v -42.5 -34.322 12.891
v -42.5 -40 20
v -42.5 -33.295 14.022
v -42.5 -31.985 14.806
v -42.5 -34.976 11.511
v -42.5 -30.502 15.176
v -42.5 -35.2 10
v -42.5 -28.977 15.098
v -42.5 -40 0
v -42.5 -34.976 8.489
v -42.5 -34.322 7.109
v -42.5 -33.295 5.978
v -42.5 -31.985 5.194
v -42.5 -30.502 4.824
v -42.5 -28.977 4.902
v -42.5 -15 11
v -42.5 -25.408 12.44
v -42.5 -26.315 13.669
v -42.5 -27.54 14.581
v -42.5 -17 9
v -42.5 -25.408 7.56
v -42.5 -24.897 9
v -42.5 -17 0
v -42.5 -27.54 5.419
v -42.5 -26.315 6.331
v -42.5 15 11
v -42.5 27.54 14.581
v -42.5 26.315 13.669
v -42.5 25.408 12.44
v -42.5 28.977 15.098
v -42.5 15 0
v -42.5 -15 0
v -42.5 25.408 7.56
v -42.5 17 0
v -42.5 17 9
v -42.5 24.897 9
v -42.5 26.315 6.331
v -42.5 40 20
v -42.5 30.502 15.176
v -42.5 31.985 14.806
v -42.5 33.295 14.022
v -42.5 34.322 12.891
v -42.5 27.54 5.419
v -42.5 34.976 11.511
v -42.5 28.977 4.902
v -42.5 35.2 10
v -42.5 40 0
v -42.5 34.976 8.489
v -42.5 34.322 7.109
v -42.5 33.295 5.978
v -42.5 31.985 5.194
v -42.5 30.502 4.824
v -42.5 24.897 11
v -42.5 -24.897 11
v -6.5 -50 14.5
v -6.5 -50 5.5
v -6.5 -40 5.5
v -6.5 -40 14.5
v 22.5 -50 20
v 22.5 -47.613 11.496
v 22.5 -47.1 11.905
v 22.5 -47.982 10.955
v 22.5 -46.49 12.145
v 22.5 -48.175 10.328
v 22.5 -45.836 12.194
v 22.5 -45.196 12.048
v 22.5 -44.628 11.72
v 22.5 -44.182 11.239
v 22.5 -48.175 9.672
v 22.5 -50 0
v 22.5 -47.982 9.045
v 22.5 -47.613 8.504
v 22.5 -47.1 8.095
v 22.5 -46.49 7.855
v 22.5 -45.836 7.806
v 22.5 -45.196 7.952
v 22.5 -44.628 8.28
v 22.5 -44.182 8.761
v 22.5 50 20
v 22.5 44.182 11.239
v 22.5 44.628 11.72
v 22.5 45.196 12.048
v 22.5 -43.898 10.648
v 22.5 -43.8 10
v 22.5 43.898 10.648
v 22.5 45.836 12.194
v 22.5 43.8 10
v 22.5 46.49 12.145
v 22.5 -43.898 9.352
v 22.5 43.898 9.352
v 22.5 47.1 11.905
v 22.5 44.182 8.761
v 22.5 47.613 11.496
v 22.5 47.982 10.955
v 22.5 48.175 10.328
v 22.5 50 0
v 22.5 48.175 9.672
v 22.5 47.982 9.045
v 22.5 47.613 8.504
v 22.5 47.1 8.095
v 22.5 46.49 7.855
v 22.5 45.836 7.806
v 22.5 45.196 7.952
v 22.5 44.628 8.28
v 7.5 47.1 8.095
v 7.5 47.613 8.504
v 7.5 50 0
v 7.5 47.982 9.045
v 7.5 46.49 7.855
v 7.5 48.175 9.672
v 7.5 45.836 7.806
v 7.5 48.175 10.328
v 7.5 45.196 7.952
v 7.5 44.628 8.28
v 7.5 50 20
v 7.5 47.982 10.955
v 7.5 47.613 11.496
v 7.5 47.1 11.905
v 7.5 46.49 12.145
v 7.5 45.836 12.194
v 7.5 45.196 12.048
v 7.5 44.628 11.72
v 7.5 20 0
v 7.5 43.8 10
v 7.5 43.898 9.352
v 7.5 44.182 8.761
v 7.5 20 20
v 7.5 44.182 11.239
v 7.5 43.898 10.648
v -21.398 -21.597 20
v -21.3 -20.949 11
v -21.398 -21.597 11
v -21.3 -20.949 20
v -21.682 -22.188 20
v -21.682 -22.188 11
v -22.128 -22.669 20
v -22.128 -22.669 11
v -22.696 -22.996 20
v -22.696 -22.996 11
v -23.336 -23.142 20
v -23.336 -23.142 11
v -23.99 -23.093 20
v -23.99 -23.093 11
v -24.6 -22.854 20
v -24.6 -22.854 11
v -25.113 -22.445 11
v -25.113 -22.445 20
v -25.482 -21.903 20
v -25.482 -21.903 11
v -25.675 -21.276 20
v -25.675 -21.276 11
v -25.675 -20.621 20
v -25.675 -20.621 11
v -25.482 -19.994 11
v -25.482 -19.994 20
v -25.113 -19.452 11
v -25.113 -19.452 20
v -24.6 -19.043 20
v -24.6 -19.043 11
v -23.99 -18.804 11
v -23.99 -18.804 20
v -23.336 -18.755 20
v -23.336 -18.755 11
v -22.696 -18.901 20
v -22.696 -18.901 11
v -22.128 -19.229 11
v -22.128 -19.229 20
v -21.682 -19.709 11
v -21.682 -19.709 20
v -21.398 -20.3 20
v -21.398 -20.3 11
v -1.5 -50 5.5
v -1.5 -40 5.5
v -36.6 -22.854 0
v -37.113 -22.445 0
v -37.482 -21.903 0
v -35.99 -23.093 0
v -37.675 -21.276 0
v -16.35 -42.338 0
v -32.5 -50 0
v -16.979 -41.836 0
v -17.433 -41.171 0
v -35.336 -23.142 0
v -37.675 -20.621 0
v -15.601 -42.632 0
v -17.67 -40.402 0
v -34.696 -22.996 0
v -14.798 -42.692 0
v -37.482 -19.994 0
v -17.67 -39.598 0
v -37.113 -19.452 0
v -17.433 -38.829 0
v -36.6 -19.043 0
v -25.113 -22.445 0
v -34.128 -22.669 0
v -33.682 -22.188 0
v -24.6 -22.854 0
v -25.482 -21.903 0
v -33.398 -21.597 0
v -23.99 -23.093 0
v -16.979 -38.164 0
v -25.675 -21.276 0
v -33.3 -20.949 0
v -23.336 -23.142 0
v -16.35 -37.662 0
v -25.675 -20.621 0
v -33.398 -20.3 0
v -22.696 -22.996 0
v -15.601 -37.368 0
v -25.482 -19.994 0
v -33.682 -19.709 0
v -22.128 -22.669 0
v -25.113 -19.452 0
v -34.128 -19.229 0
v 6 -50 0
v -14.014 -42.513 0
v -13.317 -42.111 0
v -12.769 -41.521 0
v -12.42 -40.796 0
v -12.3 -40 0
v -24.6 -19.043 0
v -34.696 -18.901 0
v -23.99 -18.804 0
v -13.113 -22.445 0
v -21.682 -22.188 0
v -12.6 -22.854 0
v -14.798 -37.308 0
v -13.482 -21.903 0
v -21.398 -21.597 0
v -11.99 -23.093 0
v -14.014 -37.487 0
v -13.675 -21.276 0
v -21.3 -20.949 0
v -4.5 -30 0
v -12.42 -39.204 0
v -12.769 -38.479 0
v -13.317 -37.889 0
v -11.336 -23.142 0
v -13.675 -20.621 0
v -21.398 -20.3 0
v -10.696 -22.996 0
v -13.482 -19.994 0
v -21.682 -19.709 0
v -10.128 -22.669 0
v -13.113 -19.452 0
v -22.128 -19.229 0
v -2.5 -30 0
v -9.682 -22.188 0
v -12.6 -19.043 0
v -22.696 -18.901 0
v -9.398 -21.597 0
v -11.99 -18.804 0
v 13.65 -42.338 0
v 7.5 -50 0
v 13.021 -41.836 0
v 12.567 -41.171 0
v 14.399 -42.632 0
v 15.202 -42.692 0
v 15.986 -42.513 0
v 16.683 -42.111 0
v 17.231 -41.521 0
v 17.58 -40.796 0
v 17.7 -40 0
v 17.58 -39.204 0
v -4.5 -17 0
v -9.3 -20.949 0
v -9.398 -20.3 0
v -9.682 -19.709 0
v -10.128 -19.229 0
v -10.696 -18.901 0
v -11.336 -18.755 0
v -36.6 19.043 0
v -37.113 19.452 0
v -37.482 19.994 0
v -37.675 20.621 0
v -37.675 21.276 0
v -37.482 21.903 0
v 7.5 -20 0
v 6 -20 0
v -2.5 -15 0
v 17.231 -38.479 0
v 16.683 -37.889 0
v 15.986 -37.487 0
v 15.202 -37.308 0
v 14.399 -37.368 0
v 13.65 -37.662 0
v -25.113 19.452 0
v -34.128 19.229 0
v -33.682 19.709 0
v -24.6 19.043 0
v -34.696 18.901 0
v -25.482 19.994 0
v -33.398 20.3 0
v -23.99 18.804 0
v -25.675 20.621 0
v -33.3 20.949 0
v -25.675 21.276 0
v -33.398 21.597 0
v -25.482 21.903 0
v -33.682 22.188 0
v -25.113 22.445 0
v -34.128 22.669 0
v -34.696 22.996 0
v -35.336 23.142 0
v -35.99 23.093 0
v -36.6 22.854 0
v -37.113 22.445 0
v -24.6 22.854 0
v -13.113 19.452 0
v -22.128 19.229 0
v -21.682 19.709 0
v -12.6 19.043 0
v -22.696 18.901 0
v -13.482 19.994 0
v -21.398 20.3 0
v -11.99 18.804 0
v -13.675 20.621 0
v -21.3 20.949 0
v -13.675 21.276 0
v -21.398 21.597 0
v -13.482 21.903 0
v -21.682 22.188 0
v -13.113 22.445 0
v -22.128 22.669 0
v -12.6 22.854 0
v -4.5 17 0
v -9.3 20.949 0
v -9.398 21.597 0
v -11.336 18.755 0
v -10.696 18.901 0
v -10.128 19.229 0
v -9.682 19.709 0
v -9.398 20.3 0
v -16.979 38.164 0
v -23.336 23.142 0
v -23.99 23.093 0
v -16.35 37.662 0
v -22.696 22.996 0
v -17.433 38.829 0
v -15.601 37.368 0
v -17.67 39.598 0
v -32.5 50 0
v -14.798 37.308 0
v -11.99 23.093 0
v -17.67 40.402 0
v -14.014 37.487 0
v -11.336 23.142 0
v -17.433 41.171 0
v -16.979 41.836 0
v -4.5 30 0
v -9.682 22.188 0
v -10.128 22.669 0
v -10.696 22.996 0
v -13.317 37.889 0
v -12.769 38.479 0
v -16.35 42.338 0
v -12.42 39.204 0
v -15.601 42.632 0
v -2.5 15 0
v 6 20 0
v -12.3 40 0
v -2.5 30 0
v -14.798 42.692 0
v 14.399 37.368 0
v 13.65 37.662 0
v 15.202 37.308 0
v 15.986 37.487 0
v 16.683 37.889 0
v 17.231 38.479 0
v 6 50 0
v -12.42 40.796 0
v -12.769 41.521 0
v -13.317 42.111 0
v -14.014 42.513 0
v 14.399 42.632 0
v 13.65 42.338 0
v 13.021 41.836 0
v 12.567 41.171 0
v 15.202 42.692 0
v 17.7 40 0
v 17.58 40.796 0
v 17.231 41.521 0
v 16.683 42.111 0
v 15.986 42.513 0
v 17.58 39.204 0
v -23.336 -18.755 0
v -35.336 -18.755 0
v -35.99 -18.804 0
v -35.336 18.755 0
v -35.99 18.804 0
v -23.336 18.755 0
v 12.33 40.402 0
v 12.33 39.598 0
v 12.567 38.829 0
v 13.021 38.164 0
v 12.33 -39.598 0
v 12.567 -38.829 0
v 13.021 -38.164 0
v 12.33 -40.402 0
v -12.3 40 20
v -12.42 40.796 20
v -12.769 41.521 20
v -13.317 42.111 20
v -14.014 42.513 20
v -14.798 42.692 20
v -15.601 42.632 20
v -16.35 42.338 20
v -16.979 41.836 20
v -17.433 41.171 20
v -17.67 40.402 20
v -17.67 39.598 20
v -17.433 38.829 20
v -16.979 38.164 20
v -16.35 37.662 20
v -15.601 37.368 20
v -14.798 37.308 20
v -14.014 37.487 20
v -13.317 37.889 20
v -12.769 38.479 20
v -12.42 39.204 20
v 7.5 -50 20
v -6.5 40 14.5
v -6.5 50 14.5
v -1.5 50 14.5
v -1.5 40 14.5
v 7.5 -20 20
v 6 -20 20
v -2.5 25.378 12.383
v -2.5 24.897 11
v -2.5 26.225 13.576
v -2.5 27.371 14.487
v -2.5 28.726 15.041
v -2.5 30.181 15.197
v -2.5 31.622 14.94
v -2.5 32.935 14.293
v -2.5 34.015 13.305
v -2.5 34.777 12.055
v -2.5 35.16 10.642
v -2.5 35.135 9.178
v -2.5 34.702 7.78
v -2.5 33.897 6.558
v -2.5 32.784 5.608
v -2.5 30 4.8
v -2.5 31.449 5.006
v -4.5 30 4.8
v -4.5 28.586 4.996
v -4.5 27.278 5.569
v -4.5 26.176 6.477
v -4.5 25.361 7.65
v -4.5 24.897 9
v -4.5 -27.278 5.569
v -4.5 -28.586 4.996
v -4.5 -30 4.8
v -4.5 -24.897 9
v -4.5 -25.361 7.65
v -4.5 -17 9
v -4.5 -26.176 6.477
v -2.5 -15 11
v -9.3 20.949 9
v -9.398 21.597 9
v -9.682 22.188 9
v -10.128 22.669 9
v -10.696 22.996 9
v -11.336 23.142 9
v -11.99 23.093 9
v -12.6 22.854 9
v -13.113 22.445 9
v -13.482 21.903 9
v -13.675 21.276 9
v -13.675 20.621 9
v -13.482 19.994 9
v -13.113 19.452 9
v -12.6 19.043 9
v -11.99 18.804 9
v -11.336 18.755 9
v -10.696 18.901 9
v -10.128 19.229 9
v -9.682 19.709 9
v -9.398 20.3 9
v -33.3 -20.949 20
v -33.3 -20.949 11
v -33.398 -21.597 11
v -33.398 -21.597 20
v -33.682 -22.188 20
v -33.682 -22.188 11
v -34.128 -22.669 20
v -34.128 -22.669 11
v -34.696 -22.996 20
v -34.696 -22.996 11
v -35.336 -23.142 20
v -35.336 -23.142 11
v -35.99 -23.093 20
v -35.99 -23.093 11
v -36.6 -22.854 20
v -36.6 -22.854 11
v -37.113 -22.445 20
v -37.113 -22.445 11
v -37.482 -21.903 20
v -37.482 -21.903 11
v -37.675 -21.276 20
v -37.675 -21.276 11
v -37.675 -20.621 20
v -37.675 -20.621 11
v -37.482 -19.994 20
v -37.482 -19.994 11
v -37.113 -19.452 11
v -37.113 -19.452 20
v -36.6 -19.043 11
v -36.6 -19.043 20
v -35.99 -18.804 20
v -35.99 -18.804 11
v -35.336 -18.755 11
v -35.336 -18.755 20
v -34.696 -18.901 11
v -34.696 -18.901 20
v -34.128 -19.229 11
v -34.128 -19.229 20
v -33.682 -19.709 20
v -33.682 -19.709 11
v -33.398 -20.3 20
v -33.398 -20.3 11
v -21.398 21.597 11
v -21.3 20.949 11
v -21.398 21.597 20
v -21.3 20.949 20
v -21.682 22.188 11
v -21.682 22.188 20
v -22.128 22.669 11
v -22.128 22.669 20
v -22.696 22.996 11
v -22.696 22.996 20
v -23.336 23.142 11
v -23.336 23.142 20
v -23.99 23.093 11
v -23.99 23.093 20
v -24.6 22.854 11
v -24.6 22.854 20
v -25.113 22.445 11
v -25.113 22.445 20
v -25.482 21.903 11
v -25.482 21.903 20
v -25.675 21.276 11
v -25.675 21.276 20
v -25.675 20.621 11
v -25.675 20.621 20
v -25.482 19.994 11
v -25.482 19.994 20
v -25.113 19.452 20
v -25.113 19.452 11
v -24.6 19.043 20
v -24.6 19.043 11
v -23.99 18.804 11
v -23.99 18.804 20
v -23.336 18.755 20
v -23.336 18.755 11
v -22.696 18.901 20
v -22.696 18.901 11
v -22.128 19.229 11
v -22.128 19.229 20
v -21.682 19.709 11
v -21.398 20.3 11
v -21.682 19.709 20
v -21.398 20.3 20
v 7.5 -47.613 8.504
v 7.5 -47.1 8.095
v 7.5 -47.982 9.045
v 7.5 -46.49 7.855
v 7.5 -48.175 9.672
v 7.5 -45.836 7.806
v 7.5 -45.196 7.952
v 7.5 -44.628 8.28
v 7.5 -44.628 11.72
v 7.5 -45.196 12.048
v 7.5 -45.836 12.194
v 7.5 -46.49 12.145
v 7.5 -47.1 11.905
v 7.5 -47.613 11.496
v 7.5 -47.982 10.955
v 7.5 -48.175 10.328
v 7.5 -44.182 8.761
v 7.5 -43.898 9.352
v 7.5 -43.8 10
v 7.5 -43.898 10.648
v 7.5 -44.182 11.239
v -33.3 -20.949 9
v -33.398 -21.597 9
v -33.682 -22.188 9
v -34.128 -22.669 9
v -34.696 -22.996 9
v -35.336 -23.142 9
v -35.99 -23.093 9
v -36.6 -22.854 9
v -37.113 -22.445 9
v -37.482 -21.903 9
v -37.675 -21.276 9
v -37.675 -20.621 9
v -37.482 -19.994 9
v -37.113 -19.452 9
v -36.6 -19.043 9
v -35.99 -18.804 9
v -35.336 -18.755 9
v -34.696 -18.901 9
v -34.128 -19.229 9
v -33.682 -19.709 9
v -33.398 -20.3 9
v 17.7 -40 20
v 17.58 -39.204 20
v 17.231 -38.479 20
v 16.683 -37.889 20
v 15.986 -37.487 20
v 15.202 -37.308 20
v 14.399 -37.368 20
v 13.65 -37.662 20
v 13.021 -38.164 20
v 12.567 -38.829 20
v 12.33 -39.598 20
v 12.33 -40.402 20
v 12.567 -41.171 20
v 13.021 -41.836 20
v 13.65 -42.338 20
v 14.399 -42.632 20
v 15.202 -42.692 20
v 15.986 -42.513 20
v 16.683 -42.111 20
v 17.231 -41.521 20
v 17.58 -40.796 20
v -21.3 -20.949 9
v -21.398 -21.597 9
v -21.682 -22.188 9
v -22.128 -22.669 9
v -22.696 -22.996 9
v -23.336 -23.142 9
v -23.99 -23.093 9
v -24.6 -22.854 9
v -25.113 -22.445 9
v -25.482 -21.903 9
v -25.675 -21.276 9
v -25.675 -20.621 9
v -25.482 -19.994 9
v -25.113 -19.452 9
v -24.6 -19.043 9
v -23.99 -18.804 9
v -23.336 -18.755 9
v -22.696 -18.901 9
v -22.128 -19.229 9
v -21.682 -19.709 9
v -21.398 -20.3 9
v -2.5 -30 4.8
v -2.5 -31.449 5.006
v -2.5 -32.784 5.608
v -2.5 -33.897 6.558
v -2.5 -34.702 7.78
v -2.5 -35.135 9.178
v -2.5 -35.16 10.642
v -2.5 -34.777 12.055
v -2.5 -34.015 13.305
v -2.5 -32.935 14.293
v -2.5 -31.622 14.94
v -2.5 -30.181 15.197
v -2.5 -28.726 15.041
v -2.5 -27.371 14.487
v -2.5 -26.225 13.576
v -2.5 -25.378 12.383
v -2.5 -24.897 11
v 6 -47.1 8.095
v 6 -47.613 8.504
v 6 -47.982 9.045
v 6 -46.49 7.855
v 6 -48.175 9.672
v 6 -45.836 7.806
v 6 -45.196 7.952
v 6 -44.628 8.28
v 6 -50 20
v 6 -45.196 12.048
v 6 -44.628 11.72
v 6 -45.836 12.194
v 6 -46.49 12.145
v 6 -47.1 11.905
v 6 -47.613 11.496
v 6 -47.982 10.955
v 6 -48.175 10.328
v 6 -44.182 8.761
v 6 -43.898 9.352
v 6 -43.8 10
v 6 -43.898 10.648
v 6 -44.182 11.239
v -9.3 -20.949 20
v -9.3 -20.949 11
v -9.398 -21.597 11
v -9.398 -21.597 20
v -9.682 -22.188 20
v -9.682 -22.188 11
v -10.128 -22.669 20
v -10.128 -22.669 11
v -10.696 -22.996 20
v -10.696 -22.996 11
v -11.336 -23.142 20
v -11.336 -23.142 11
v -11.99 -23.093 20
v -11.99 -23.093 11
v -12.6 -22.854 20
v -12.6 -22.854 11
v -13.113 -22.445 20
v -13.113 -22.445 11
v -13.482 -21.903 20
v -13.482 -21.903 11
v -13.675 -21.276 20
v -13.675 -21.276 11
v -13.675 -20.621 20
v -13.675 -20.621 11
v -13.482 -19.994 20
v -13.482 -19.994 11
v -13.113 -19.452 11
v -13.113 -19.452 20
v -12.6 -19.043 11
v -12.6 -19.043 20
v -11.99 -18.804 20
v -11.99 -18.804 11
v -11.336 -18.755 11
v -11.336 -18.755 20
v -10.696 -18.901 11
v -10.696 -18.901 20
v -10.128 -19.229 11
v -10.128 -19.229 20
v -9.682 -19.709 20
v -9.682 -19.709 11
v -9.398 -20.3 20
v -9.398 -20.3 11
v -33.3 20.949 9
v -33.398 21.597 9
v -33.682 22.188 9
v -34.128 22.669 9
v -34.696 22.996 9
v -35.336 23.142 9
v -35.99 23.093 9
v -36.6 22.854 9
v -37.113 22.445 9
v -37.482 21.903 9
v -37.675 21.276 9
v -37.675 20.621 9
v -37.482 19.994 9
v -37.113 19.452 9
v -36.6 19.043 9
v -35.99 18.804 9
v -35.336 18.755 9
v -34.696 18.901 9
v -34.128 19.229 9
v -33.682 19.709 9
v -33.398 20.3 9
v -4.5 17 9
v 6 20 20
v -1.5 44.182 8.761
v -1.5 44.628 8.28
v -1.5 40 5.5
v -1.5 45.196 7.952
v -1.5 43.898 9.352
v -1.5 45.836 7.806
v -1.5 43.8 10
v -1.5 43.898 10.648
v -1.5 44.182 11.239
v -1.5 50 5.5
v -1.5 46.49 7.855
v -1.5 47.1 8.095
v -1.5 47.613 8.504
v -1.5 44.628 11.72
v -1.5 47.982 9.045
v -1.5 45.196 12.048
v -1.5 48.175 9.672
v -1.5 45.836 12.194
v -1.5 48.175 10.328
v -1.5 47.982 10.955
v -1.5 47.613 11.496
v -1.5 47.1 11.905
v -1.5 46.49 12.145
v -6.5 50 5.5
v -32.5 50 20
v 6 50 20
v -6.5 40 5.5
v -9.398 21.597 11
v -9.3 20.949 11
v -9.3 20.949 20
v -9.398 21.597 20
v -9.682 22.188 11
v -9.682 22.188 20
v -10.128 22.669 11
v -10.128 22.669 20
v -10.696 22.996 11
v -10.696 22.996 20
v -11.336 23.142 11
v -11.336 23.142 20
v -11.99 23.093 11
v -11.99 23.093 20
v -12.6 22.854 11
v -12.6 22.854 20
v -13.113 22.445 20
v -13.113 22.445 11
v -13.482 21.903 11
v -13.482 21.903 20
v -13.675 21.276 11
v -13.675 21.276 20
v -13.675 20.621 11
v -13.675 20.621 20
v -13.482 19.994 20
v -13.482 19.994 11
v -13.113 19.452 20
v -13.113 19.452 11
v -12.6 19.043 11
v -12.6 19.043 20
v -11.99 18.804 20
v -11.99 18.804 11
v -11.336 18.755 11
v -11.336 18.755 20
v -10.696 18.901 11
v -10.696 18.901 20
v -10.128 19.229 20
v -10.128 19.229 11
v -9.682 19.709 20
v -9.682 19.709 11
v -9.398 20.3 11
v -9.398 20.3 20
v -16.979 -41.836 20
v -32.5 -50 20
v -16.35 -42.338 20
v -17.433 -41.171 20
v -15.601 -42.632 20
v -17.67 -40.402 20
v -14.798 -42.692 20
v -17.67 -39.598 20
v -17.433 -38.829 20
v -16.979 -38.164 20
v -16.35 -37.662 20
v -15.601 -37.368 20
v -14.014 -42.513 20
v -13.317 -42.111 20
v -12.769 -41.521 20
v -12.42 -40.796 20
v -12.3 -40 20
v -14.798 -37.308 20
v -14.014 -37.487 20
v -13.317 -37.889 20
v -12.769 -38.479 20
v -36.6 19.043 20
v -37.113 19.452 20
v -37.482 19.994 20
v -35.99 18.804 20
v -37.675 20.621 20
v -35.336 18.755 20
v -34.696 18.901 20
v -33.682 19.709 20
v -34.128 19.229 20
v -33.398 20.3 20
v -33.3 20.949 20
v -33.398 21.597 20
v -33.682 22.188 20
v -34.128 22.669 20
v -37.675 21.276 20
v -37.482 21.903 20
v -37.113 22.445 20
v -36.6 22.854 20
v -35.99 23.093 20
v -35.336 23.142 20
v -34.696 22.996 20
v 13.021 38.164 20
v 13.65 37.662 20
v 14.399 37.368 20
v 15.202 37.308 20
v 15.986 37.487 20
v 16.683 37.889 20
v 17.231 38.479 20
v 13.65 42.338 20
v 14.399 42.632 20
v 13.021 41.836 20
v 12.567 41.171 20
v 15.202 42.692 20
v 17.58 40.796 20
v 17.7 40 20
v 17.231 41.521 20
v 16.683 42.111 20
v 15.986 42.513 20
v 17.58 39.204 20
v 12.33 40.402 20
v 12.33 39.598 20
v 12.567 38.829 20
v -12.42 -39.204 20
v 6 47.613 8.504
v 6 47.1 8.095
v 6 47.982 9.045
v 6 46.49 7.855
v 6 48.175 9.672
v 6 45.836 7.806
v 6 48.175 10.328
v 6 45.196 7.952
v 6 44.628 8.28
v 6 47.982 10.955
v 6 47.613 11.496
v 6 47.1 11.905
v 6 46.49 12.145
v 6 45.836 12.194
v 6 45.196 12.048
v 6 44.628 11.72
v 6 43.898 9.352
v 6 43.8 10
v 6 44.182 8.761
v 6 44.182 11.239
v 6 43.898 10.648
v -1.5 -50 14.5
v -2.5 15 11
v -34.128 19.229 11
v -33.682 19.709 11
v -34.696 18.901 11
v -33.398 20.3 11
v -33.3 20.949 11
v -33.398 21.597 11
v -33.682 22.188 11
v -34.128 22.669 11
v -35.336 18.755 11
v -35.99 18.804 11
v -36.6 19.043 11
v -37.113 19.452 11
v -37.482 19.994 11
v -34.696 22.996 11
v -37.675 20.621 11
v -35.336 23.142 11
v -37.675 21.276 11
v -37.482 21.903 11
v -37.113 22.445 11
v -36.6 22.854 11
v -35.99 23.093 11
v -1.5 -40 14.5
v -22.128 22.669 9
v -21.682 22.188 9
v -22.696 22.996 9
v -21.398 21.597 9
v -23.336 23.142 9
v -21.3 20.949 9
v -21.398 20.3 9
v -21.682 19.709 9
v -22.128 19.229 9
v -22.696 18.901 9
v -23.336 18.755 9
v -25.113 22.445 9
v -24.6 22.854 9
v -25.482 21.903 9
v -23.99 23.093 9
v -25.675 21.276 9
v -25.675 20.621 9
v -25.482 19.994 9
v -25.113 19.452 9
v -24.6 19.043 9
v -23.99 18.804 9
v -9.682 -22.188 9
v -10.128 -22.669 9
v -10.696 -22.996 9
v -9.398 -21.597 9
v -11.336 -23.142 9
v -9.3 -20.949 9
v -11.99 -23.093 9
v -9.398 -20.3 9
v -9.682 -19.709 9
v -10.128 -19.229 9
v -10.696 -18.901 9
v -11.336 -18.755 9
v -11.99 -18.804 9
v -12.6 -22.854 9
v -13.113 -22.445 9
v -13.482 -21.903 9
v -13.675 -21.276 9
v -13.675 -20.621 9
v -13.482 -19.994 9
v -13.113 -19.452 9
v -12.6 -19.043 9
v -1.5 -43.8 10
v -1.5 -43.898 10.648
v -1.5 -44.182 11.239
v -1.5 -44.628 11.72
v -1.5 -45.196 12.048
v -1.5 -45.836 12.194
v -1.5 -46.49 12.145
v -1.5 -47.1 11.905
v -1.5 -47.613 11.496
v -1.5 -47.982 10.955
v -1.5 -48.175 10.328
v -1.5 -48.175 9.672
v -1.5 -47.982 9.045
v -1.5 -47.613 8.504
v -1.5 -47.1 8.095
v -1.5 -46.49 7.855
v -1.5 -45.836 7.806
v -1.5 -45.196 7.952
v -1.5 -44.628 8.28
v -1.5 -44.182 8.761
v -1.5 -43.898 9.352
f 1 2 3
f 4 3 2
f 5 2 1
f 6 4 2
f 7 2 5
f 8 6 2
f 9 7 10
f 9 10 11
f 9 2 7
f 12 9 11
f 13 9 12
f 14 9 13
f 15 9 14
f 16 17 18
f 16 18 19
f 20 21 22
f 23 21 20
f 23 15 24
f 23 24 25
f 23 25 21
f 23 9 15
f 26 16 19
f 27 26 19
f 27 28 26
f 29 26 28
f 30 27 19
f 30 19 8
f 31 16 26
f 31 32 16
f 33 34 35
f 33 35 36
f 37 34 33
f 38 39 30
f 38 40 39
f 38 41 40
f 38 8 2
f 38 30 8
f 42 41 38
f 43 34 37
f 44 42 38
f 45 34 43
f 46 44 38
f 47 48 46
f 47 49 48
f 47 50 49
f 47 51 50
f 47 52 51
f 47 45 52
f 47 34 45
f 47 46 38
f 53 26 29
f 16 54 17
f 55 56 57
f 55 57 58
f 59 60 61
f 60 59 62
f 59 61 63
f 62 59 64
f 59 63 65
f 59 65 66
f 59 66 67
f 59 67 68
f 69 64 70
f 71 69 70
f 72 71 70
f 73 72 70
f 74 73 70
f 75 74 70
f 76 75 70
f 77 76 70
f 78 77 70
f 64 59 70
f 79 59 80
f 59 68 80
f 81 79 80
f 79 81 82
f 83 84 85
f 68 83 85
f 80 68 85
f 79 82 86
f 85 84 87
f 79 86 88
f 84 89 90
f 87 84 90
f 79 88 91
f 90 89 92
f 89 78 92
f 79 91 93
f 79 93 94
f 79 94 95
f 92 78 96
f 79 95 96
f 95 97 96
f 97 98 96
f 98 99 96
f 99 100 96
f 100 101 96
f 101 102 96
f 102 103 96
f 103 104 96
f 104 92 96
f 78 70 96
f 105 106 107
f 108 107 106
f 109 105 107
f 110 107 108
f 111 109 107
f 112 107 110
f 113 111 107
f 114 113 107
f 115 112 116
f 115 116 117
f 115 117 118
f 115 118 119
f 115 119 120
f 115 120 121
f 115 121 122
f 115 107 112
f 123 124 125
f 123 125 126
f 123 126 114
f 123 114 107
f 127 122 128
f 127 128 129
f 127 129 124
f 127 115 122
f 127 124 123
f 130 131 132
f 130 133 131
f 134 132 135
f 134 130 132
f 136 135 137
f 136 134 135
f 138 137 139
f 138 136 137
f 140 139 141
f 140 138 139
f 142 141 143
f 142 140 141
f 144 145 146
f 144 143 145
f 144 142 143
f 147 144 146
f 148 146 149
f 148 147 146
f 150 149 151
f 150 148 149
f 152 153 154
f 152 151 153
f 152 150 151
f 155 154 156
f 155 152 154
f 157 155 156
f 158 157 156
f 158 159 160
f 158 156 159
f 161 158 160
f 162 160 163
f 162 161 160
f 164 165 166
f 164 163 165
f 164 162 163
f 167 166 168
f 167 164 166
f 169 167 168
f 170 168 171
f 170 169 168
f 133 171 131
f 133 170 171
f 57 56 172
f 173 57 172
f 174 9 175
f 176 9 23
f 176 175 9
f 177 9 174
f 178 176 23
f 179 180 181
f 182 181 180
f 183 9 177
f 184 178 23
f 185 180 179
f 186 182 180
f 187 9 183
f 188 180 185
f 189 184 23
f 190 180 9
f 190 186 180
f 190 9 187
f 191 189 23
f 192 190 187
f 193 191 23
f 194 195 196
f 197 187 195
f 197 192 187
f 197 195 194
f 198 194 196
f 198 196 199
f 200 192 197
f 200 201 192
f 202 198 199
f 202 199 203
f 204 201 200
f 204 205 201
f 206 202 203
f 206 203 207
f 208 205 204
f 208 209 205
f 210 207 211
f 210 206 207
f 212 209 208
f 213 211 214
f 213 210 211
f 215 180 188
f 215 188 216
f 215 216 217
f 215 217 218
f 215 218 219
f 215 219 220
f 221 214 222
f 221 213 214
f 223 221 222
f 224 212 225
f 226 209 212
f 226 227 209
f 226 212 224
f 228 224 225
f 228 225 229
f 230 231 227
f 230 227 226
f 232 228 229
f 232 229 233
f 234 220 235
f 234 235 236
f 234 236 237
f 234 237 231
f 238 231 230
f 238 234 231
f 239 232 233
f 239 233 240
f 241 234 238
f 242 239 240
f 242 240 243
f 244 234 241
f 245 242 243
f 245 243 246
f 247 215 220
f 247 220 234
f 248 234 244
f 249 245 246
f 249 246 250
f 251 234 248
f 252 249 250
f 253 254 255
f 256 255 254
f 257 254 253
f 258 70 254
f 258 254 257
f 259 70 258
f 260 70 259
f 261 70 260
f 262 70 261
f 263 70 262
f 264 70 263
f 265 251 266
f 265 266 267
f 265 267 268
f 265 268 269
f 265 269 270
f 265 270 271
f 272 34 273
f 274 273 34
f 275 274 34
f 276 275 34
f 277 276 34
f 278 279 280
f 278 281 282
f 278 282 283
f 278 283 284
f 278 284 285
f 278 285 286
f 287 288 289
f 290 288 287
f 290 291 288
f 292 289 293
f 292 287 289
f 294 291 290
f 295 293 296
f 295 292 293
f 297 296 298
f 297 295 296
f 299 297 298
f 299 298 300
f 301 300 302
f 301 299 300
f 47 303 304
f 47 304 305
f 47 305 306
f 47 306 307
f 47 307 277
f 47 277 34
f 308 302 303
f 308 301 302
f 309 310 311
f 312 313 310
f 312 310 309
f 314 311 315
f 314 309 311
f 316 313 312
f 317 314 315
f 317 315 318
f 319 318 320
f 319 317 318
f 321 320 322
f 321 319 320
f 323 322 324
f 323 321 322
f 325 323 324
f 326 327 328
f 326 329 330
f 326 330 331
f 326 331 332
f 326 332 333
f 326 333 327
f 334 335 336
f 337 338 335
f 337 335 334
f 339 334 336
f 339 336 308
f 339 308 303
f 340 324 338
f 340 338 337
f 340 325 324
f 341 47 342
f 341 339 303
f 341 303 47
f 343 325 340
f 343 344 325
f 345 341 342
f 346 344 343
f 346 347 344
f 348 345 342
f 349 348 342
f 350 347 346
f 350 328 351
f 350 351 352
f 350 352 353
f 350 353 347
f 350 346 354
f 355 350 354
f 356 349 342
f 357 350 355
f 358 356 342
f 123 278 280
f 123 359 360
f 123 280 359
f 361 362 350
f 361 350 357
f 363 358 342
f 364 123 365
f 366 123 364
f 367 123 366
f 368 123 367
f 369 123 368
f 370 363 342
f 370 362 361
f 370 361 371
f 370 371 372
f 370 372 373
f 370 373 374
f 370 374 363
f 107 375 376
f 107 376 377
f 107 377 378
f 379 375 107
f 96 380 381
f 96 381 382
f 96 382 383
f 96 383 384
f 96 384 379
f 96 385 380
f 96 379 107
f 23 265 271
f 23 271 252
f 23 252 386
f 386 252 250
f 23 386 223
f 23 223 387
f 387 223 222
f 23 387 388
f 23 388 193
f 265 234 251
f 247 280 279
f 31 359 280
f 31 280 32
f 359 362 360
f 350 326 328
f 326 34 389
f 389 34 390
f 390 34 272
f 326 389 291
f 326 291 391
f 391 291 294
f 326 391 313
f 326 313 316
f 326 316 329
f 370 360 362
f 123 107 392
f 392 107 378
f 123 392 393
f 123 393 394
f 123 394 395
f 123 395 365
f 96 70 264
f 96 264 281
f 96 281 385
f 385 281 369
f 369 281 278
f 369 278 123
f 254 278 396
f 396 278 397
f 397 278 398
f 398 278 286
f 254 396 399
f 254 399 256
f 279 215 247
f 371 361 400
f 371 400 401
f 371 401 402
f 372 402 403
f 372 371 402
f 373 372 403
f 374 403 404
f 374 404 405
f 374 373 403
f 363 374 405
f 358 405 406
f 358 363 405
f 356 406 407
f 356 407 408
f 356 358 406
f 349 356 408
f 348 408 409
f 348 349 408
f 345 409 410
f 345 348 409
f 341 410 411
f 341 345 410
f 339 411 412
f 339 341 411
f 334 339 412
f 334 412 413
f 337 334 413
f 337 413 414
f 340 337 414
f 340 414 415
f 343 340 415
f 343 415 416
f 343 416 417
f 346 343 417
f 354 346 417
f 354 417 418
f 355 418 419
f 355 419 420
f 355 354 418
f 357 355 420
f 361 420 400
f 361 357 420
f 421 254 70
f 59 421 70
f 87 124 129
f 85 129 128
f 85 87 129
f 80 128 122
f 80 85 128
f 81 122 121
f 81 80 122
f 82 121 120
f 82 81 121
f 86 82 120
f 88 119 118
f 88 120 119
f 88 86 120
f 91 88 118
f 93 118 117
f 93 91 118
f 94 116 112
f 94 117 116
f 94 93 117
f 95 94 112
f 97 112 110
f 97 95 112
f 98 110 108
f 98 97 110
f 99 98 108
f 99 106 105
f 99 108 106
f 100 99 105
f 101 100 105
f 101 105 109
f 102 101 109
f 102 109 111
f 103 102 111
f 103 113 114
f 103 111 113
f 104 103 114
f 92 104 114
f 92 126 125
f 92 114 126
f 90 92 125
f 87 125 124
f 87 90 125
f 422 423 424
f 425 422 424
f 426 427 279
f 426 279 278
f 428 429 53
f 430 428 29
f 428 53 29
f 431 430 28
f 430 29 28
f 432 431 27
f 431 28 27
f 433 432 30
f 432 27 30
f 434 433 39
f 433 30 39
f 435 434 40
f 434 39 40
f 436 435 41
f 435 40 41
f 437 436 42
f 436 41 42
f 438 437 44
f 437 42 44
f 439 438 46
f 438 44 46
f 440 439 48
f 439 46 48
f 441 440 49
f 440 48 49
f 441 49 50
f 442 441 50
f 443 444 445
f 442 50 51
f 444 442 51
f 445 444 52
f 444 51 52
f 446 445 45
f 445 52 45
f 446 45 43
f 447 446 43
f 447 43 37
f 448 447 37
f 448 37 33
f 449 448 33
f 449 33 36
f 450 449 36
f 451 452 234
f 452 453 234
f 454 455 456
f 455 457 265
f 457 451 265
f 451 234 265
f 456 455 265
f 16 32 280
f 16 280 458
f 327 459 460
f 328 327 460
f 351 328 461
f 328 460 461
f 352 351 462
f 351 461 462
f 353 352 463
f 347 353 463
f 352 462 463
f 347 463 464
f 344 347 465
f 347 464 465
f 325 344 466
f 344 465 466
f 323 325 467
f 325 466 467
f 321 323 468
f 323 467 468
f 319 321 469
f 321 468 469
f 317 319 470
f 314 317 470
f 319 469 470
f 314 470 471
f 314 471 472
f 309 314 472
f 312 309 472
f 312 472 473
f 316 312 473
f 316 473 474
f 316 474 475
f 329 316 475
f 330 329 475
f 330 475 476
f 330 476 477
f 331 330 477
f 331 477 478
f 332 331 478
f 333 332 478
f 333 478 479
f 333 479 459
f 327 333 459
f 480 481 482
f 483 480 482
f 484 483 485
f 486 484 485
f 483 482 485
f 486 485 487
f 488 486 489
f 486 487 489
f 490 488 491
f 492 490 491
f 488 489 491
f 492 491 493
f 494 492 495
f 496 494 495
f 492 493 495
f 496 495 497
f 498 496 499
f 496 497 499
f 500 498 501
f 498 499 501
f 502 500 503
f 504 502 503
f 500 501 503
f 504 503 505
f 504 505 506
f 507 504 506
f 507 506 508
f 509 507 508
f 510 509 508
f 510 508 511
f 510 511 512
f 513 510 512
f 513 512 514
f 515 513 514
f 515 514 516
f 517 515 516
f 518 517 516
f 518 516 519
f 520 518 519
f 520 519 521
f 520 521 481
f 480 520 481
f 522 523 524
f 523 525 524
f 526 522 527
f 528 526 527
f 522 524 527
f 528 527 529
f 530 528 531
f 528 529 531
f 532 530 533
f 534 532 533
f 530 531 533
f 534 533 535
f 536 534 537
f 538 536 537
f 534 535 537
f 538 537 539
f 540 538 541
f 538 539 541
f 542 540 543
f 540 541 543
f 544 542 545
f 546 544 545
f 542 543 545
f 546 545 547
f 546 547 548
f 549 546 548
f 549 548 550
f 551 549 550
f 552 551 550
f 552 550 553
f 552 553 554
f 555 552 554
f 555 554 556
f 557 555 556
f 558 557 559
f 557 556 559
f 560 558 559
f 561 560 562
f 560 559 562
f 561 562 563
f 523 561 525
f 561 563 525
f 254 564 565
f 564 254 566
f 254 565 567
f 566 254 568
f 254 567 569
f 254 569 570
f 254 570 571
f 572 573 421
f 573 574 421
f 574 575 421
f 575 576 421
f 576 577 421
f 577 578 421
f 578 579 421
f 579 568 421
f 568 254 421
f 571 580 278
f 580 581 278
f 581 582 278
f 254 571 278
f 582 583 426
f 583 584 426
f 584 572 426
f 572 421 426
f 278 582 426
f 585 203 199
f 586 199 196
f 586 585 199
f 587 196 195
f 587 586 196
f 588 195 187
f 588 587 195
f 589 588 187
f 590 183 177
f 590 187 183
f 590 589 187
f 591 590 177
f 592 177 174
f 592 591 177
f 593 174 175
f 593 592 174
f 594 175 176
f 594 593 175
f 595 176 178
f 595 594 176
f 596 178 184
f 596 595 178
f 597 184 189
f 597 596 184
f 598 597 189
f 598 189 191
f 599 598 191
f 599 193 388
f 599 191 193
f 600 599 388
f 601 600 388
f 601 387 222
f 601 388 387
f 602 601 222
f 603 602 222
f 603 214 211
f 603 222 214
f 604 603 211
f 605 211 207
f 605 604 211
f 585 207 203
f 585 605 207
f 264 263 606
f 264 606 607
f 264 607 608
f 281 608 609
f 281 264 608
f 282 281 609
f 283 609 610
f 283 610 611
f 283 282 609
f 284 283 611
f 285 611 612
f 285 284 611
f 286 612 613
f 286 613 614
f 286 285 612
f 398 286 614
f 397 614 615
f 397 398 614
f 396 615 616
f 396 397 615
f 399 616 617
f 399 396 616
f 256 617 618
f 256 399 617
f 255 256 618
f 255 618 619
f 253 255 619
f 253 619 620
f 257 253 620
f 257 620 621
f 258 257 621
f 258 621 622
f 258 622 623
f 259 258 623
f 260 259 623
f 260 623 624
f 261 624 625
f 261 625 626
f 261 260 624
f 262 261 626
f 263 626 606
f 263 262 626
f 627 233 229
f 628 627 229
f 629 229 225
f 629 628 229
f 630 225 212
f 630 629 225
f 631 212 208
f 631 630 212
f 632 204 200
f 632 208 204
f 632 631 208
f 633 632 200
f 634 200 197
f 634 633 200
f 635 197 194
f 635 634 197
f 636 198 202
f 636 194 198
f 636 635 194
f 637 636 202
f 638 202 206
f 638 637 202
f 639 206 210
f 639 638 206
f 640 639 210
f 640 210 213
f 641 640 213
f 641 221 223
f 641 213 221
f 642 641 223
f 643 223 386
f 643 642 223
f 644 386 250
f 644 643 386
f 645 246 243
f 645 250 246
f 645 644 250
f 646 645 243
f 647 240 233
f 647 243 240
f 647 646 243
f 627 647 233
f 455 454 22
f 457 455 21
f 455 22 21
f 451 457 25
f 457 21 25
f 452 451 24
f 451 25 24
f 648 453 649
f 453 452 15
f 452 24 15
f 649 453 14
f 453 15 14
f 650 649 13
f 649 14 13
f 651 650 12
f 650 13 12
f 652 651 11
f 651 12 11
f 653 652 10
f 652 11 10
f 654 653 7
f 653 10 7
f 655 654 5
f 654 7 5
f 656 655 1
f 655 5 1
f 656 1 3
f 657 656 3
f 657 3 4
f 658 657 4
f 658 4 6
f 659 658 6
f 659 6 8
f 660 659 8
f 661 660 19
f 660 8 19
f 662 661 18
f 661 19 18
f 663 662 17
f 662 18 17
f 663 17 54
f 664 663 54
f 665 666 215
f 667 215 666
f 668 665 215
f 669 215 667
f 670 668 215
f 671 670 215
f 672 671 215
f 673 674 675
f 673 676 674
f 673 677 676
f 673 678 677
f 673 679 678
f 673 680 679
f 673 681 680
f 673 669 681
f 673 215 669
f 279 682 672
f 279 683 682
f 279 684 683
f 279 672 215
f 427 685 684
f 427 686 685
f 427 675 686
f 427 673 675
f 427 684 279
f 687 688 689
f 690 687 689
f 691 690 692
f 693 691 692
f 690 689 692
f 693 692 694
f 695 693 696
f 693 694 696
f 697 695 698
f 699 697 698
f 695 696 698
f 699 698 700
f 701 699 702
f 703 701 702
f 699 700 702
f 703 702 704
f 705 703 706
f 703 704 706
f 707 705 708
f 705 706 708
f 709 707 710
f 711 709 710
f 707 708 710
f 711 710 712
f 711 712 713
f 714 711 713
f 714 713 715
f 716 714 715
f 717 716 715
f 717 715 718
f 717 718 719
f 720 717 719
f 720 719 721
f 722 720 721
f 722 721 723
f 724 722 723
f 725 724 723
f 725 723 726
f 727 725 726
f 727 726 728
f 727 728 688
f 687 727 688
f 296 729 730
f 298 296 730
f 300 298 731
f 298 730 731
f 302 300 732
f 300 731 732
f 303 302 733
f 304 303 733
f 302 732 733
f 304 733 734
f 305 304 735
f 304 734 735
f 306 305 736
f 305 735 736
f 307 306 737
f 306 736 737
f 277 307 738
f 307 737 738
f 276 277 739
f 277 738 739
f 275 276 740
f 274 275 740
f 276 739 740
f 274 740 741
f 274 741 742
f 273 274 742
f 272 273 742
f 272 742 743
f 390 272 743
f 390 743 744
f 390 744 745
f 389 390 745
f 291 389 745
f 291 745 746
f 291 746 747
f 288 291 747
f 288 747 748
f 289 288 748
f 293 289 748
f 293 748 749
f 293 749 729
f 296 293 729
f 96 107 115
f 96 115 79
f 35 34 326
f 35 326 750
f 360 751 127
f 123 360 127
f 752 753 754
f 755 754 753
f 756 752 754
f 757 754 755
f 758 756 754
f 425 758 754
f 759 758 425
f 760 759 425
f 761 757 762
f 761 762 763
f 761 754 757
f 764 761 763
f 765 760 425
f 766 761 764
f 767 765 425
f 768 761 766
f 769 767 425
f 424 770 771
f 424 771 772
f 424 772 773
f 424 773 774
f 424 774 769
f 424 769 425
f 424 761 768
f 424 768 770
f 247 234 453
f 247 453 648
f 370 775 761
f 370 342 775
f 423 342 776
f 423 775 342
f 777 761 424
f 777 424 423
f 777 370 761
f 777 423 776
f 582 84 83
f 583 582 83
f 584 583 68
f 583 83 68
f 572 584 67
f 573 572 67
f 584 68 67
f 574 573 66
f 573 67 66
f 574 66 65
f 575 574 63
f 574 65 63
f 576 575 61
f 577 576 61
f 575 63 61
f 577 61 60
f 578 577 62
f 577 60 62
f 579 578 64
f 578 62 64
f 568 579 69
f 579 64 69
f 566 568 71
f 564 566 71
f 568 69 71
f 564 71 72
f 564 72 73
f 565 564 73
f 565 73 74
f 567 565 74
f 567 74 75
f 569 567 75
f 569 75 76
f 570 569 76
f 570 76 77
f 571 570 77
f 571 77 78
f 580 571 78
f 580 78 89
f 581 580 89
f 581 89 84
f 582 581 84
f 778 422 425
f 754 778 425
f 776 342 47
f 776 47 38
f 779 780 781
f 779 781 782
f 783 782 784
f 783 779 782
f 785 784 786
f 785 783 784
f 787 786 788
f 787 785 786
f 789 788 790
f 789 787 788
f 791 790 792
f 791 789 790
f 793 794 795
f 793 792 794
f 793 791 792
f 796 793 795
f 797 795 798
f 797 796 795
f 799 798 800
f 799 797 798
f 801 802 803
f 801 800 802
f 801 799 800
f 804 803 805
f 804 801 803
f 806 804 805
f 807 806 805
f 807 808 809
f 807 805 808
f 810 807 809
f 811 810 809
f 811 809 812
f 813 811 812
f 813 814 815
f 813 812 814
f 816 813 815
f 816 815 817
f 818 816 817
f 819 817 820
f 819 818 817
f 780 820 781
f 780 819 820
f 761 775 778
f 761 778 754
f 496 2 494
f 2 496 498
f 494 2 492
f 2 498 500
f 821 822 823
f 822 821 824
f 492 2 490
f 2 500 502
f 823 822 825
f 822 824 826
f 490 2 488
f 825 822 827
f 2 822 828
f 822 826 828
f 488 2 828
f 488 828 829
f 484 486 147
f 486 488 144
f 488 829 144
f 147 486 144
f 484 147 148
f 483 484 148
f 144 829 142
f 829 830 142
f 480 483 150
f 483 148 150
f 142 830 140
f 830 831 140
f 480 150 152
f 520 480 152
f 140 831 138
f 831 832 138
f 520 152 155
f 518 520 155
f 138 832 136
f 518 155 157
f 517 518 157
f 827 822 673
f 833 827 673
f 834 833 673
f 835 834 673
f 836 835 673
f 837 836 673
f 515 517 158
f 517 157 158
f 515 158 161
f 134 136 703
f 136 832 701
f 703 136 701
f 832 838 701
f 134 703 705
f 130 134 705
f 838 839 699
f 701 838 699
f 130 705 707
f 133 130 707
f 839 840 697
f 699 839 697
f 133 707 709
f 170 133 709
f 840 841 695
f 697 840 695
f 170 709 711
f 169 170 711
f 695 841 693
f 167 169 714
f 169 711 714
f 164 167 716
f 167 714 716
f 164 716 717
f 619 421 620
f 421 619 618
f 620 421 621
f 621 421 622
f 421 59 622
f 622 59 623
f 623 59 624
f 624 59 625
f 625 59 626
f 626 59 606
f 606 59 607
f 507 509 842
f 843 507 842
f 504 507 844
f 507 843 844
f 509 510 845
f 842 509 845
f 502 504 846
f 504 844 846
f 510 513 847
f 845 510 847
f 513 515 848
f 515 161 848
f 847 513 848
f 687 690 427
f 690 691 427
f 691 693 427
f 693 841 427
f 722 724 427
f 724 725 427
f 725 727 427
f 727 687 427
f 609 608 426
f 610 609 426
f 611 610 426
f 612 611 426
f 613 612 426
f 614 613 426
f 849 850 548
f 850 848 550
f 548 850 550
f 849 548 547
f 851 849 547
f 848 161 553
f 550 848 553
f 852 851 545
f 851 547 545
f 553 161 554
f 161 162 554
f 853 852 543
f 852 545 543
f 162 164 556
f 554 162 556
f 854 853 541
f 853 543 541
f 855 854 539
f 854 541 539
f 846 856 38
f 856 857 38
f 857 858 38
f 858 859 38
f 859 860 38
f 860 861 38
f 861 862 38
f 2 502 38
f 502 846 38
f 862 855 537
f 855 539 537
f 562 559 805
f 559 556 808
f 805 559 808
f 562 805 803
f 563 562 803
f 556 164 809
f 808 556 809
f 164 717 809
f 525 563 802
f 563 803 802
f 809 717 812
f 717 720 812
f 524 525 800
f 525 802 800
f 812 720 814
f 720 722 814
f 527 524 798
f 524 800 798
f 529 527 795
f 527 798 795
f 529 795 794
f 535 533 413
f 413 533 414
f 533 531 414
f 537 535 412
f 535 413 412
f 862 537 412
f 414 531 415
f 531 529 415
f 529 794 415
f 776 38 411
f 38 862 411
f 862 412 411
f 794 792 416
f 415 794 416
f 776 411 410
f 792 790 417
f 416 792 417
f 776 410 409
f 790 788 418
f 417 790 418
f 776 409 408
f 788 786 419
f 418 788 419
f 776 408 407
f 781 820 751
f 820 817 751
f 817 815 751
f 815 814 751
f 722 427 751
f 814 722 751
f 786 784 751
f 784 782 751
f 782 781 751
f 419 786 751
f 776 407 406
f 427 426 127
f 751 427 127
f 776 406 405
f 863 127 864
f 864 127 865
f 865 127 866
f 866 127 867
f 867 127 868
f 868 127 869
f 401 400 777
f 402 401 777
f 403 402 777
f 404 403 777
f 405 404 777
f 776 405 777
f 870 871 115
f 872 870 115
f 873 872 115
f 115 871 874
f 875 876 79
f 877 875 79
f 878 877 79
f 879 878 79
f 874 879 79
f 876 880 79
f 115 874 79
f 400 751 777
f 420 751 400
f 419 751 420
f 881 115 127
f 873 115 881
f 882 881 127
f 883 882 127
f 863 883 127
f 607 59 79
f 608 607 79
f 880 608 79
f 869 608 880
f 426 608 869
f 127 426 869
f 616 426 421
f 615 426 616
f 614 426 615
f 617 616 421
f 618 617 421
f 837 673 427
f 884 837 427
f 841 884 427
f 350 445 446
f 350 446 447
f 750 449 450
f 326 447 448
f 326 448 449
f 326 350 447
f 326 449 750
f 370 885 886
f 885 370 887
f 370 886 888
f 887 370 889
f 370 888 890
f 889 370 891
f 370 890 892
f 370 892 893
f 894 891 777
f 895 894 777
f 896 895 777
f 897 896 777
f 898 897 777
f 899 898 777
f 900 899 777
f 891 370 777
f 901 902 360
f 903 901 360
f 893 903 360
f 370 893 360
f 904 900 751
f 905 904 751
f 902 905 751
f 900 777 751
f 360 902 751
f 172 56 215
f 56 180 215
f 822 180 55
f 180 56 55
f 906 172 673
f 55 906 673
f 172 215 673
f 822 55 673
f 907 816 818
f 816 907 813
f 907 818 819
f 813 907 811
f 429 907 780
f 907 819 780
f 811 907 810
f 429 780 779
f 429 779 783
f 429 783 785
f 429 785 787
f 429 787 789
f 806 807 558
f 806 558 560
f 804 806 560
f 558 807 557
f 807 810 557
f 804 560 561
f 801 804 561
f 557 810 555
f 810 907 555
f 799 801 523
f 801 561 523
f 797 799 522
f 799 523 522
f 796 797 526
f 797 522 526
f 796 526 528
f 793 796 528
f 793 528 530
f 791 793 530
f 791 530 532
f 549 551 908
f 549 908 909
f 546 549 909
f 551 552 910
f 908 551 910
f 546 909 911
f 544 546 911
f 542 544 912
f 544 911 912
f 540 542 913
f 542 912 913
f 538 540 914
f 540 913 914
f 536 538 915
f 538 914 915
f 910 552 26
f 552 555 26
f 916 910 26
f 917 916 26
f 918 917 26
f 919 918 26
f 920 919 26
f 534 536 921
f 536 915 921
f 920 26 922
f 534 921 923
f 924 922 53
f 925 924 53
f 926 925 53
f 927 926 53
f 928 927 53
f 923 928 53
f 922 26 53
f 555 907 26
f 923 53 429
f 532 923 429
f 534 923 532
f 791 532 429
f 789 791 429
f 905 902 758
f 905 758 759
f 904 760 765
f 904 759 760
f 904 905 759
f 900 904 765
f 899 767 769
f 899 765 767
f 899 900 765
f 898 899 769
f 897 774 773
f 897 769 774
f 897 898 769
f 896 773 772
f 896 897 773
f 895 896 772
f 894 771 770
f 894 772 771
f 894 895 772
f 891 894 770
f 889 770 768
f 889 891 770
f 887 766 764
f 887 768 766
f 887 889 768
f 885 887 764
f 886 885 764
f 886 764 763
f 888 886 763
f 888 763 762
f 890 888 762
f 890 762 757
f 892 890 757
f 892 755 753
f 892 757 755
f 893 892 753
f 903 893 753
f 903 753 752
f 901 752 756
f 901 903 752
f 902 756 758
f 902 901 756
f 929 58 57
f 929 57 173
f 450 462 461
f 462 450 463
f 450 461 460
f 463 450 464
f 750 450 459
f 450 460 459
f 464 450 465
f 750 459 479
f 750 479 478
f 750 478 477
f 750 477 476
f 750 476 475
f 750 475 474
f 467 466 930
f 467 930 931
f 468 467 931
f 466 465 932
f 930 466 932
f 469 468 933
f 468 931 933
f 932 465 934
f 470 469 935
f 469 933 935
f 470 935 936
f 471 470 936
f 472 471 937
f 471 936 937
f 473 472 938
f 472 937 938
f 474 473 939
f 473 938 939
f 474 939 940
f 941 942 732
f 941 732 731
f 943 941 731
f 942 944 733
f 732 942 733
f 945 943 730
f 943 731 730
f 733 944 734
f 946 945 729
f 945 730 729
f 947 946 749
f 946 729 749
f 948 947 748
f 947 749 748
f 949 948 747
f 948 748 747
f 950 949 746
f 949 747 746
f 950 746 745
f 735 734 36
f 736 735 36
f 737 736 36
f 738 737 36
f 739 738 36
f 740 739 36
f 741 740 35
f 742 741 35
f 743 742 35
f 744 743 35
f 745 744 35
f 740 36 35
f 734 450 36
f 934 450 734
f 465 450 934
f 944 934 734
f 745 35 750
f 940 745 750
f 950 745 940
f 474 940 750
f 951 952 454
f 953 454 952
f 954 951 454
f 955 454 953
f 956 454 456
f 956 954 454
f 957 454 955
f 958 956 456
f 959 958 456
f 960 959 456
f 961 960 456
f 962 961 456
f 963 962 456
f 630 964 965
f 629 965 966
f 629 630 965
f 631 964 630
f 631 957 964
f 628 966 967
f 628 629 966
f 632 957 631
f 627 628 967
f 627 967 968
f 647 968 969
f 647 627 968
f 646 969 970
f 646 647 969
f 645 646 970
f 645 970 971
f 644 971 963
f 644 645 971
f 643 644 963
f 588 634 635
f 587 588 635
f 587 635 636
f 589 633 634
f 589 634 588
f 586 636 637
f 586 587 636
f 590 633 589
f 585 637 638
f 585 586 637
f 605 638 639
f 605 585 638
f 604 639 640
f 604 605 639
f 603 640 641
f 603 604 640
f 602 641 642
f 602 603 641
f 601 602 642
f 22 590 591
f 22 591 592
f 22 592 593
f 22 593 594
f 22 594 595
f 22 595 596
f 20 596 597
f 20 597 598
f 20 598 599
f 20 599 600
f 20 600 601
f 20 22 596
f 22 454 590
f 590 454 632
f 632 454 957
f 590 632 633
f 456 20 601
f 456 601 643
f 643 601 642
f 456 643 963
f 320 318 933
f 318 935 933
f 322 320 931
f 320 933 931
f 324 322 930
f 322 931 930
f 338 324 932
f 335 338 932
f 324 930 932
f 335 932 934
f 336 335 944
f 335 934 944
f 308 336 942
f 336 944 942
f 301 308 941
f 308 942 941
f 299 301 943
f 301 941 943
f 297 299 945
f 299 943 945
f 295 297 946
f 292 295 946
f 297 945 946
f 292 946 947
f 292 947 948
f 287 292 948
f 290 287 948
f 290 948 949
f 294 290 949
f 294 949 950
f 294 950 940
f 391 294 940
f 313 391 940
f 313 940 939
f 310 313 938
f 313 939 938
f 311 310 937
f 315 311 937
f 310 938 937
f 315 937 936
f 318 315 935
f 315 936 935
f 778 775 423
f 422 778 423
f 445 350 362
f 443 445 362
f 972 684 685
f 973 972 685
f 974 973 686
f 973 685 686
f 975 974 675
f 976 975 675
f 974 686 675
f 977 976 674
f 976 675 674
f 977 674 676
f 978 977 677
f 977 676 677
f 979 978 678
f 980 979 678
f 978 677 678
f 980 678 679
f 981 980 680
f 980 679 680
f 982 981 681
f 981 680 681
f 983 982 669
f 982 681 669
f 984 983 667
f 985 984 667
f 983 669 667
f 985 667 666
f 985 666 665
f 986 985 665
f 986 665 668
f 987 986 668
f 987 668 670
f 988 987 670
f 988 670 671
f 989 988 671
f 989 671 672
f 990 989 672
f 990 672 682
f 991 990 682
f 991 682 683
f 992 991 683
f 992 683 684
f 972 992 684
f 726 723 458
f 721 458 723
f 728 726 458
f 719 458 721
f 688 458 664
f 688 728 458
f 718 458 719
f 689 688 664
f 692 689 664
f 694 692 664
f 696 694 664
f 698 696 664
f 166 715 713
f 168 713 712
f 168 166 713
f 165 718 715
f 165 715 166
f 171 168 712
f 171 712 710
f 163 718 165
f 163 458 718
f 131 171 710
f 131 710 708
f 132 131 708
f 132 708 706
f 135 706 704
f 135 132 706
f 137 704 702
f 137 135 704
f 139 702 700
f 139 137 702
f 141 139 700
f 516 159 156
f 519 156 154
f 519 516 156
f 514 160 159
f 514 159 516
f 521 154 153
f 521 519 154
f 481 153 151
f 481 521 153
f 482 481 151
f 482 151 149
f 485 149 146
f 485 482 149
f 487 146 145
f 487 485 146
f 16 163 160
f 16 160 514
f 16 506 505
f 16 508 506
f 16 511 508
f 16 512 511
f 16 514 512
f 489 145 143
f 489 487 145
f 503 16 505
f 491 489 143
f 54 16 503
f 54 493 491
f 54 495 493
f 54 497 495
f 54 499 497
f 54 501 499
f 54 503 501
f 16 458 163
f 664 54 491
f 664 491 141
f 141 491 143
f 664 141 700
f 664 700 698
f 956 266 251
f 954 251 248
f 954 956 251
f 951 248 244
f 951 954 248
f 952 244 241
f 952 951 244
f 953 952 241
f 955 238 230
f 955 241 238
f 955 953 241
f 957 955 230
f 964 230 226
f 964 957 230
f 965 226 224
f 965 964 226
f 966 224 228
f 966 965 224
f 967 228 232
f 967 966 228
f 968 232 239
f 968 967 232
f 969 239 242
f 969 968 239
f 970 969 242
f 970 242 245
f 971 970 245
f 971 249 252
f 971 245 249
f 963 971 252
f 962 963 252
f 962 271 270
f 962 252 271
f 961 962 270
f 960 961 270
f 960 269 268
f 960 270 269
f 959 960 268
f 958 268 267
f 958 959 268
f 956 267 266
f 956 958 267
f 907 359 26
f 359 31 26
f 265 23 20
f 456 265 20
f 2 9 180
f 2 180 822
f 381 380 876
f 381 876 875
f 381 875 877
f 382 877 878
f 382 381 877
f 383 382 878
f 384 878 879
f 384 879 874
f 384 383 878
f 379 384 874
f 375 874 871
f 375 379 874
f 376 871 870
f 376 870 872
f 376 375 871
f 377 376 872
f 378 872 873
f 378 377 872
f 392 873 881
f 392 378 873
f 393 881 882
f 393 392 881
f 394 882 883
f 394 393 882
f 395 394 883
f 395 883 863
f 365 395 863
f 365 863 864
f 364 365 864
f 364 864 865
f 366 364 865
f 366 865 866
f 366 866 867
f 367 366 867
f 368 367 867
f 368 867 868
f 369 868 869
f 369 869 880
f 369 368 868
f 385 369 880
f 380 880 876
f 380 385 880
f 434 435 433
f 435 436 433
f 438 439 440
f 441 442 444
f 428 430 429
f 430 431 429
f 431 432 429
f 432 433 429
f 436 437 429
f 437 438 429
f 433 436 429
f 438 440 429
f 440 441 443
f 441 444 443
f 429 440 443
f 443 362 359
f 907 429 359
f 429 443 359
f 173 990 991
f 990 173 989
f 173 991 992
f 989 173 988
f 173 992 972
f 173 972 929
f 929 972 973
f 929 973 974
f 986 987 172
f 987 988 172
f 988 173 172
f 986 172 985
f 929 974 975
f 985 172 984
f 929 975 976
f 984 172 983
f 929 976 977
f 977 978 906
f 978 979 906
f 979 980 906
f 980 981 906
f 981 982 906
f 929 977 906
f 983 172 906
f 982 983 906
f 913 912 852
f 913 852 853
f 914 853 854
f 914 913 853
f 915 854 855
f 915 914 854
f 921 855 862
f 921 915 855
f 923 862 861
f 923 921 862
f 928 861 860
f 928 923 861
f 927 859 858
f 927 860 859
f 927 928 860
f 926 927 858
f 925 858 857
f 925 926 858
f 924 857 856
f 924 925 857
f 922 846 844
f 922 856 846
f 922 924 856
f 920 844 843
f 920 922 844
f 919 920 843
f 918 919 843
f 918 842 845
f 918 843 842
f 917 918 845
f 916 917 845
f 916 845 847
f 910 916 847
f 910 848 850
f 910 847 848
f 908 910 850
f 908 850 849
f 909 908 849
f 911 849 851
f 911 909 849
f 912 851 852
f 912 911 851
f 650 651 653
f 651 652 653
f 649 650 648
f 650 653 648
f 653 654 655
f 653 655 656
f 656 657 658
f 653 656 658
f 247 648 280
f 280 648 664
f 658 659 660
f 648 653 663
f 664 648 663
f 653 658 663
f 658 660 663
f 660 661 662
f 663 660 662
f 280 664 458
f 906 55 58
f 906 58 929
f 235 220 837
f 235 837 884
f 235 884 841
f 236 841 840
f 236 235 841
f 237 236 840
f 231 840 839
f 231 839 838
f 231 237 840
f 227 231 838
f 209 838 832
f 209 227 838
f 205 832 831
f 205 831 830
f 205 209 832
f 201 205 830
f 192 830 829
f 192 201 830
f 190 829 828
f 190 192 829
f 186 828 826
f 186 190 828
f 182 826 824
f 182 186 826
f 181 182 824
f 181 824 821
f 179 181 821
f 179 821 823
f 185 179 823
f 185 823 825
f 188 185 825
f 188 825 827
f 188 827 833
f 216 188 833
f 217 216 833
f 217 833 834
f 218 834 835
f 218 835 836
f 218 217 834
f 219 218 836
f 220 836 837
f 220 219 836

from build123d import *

# Parameters (mm, degrees)
F0_W      = 45
F0_H      = 100
F0_R      = 2.7
F1_DEPTH  = 20
F2_W      = 1.5
F2_H      = 30
F3_DEPTH  = 25
F4_R      = 2.2
F5_DEPTH  = 25
F6_DEPTH  = 20
F7_R      = 5.2
F8_DEPTH  = 40
F9_W      = 2
F9_H      = 9
F10_DEPTH = 40
F11_W     = 2
F11_H     = 15
F12_DEPTH = 10
F13_R     = 2.2
F14_DEPTH = 25
F15_SIZE  = 10
F16_W     = 5
F16_H     = 9
F17_DEPTH = 10


# Not quite as in the source:
# - a pattern or mirror of a feature is missing from the dataset's text; its kind, count and spacing are read off the source's solid


with BuildPart() as f1:
    # F0 (on Top) → F1 (new body)
    with BuildSketch(Plane.XY):
        Rectangle(F0_W, F0_H)
        with Locations((-15, -40)):
            Circle(F0_R, mode=Mode.SUBTRACT)
        with Locations((15, -40)):
            Circle(F0_R, mode=Mode.SUBTRACT)
        with Locations((-15, 40)):
            Circle(F0_R, mode=Mode.SUBTRACT)
        with Locations((15, 40)):
            Circle(F0_R, mode=Mode.SUBTRACT)
    extrude(amount=F1_DEPTH)

    # F2 (on face) → F3 (cut)
    with BuildSketch(Plane.XY.offset(20)):
        with Locations((6.75, -35)):
            Rectangle(F2_W, F2_H)
    f3 = extrude(amount=-F3_DEPTH, mode=Mode.SUBTRACT)

    # F3_copies: F3 across plane
    add(f3.mirror(Plane.ZX), mode=Mode.SUBTRACT)

    # F4 (on face) → F5 (cut)
    with BuildSketch(Plane.YZ.offset(22.5)):
        with Locations((-46, 10)):
            Circle(F4_R)
    f5 = extrude(amount=-F5_DEPTH, mode=Mode.SUBTRACT)

    # F5_copies: F5 across plane
    add(f5.mirror(Plane.ZX), mode=Mode.SUBTRACT)

    # F6 (add): a face of the model
    f6_faces = [f1.faces().sort_by_distance(p)[0] for p in [
        (-22.5, 0, 10),
    ]]
    extrude(f6_faces, amount=F6_DEPTH)

    # F7 (on face) → F8 (cut)
    with BuildSketch(Plane(origin=(-42.5, 0, 0), x_dir=(0, -1, 0), z_dir=(-1, 0, 0))):
        with Locations((-30, 10)):
            Circle(F7_R)
        with Locations((30, 10)):
            Circle(F7_R)
    extrude(amount=-F8_DEPTH, mode=Mode.SUBTRACT)

    # F9 (on face) → F10 (cut)
    with BuildSketch(Plane(origin=(-42.5, 0, 0), x_dir=(0, -1, 0), z_dir=(-1, 0, 0))):
        with Locations((-16, 4.5)):
            Rectangle(F9_W, F9_H)
        Polygon((-17, 9), (-15, 9), (-15, 11), (-30, 11), (-30, 9), align=None)
    f10 = extrude(amount=-F10_DEPTH, mode=Mode.SUBTRACT)

    # F10_copies: F10 across plane
    add(f10.mirror(Plane(origin=(0, 0, 0), x_dir=(0, 0, -1), z_dir=(0, -1, 0))), mode=Mode.SUBTRACT)

    # F11 (on face) → F12 (cut)
    with BuildSketch(Plane(origin=(0, 0, 0), x_dir=(1, 0, 0), z_dir=(0, 0, -1))):
        with Locations((-3.5, -22.5)):
            Rectangle(F11_W, F11_H)
    f12 = extrude(amount=-F12_DEPTH, mode=Mode.SUBTRACT)

    # F12_copies: F12 across plane
    add(f12.mirror(Plane(origin=(0, 0, 0), x_dir=(0, 0, -1), z_dir=(0, -1, 0))), mode=Mode.SUBTRACT)

    # F13 (on face) → F14 (cut, symmetric)
    with BuildSketch(Plane.XY.offset(9)):
        with Locations((-35.5, 20.9485298356)):
            Circle(F13_R)
        with Locations((-11.5, 20.9485298356)):
            Circle(F13_R)
        with Locations((-23.5, 20.9485298356)):
            Circle(F13_R)
    f14 = extrude(amount=F14_DEPTH, both=True, mode=Mode.SUBTRACT)

    # F14_copies: F14 across plane
    add(f14.mirror(Plane(origin=(0, 0, 0), x_dir=(0, 0, -1), z_dir=(0, -1, 0))), mode=Mode.SUBTRACT)

    # F15
    f15_edges = [f1.edges().sort_by_distance(p)[0] for p in [
        (-42.5, 50, 10),
        (-42.5, -50, 10),
    ]]
    chamfer(f15_edges, length=F15_SIZE)

    # F16 (on face) → F17 (cut)
    with BuildSketch(Plane.XZ.offset(50)):
        with Locations((-4, 10)):
            Rectangle(F16_W, F16_H)
    f17 = extrude(amount=-F17_DEPTH, mode=Mode.SUBTRACT)

    # F17_copies: F17 across plane
    add(f17.mirror(Plane.ZX), mode=Mode.SUBTRACT)


solid = f1.part
